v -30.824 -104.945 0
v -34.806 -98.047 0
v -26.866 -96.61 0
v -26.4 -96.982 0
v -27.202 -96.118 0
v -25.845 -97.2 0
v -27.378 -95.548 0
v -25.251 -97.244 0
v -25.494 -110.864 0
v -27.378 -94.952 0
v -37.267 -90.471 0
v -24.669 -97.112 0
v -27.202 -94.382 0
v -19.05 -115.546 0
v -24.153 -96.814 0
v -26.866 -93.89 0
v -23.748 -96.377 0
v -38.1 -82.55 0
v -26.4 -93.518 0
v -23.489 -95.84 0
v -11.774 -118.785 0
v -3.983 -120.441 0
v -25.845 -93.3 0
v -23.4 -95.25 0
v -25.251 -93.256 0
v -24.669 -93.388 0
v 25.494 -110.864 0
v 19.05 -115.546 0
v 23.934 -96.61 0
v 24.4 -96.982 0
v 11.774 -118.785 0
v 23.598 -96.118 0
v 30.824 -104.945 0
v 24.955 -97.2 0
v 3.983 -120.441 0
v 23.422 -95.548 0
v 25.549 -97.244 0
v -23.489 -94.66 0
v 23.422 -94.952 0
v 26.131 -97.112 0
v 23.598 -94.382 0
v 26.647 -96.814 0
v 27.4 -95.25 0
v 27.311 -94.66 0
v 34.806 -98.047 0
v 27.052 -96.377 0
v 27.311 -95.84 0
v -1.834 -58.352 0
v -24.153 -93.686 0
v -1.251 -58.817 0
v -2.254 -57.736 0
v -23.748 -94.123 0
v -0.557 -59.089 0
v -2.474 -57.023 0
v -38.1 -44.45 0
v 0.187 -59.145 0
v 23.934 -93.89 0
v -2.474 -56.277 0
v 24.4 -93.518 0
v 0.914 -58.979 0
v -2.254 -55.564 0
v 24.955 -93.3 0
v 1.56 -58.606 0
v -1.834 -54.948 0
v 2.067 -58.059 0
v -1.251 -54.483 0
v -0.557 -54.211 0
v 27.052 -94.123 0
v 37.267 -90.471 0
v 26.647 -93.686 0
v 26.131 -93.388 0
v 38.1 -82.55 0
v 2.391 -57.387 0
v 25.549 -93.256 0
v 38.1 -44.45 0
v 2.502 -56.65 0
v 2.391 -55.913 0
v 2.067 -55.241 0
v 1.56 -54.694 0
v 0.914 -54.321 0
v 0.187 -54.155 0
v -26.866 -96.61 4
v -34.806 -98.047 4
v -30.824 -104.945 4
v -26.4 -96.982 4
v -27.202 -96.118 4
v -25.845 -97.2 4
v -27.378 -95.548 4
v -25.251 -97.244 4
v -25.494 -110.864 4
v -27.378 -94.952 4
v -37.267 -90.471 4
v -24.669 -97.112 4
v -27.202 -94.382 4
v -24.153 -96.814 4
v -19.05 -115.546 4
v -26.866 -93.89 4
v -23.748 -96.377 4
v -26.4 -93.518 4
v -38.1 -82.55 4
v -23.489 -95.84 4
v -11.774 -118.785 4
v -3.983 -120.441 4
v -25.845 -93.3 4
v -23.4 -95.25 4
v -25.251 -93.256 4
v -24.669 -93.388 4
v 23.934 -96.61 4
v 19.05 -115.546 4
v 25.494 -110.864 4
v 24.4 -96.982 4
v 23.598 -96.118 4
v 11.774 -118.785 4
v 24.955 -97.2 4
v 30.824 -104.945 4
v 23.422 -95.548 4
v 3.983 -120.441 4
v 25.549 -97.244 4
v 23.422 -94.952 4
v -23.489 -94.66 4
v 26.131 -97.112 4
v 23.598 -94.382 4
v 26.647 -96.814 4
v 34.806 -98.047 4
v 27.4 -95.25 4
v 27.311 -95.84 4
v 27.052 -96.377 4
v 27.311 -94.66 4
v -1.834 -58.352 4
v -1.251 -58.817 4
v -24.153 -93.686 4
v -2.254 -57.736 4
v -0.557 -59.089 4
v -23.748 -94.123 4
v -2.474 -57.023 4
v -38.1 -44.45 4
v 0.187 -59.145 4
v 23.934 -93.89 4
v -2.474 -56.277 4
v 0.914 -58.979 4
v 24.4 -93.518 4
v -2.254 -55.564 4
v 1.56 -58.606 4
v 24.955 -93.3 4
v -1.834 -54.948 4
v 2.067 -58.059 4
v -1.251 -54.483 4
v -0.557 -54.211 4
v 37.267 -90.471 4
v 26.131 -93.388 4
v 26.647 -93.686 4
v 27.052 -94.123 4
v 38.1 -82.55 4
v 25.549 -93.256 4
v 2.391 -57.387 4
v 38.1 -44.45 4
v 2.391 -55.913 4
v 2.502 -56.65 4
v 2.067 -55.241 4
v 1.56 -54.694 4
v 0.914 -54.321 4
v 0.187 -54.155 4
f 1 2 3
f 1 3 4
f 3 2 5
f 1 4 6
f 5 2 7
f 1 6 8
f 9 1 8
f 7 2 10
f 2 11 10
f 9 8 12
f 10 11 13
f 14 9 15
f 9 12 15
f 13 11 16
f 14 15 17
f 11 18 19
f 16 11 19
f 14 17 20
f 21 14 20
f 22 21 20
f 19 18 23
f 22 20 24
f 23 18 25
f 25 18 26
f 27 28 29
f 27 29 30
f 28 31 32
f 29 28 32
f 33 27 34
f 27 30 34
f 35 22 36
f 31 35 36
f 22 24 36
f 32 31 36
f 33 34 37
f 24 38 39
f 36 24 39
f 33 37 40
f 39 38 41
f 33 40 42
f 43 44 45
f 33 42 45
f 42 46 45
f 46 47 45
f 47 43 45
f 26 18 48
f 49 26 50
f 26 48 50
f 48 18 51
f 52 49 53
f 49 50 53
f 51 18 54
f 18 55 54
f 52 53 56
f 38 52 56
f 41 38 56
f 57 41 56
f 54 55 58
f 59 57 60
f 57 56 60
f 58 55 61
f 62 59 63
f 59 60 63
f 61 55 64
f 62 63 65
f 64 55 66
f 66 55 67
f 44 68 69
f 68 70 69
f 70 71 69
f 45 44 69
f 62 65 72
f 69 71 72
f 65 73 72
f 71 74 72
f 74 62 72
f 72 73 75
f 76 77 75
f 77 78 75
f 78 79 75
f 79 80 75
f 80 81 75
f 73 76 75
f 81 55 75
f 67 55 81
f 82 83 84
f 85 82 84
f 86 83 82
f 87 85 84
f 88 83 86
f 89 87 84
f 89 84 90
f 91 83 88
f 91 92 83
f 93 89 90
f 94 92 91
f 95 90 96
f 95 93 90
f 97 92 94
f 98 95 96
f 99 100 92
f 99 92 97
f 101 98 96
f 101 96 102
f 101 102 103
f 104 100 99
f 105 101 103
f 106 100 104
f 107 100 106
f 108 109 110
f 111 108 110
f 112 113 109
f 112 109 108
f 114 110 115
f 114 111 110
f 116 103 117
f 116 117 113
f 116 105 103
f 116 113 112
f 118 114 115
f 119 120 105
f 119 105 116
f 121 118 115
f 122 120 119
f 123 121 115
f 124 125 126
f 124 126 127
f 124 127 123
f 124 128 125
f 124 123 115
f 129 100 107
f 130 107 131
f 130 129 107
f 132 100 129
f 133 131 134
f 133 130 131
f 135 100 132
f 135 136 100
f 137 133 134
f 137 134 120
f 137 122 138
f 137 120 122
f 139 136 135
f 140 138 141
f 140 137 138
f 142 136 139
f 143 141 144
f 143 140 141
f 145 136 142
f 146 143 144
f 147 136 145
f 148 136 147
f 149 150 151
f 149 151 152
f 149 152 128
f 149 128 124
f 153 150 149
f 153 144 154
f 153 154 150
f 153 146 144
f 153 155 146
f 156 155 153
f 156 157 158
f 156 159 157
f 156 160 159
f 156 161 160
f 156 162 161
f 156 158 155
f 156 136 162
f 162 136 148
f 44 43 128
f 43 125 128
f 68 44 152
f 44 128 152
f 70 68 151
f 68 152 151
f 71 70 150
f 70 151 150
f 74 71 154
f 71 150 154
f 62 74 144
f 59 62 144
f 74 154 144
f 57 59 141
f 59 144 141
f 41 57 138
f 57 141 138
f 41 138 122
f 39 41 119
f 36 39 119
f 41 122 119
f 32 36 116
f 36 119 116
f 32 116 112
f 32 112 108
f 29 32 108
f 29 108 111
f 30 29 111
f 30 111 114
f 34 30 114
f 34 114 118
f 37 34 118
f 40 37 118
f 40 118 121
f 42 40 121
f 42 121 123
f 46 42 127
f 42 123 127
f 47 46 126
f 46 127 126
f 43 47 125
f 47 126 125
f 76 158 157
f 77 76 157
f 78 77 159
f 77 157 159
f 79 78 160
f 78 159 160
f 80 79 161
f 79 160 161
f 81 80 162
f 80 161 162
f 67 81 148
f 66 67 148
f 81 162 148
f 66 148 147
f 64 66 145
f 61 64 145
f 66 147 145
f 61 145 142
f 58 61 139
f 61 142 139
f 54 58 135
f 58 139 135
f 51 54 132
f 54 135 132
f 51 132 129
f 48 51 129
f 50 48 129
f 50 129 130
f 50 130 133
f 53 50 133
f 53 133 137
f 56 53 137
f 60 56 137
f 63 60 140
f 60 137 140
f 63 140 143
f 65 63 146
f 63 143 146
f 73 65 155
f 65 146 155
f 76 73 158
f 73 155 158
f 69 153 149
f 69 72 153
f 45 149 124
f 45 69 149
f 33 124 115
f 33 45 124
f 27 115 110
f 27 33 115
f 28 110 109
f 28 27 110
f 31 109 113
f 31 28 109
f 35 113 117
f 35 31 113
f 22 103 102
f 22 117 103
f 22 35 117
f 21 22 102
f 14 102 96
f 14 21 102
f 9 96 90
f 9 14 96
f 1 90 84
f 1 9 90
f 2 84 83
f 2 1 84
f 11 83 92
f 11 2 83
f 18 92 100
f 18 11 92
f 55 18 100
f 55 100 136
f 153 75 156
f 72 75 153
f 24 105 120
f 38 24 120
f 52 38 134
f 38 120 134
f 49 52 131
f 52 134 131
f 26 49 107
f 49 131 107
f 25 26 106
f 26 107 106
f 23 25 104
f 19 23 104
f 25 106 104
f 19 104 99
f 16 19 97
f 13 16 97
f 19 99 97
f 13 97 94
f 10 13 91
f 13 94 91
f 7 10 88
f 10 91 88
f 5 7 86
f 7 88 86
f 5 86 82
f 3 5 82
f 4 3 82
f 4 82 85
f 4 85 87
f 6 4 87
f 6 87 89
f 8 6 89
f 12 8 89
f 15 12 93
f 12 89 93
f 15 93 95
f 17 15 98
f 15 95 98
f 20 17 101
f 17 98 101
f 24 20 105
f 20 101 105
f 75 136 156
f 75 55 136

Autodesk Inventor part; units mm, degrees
ref_plane "YZ Plane" through (0, 0, 0) normal (1, 0, 0) x (0, 1, 0)
ref_plane "XZ Plane" through (0, 0, 0) normal (0, 1, 0) x (-1, 0, 0)
sketch "Sketch1" plane through (0, 0, 0) normal (0, 0, 1) x (1, 0, 0)
  line L0 (6.35, -214.55) -> (43.1, -214.55) projected
  line L1 (43.1, -214.55) -> (43.1, -189.15) projected
  line L2 (43.1, -189.15) -> (40.1028, -189.15) projected
  line L3 (40.1028, -189.15) -> (40.1028, -176.45) projected
  line L4 (40.1028, -176.45) -> (43.1, -176.45) projected
  line L5 (43.1, -176.45) -> (43.1, -110.25) projected
  line L6 (43.1, -110.25) -> (40.1028, -110.25) projected
  line L7 (40.1028, -110.25) -> (40.1028, -97.55) projected
  line L8 (40.1028, -97.55) -> (43.1, -97.55) projected
  line L9 (43.1, -97.55) -> (43.1, -72.15) projected
  line L10 (43.1, -72.15) -> (35.023, -72.15) projected
  arc A0 (-35.023, -72.15) -> (35.023, -72.15) centre (0, -57.15) ccw projected
  line L11 (-35.023, -72.15) -> (-43.1, -72.15) projected
  line L12 (-43.1, -72.15) -> (-43.1, -97.55) projected
  line L13 (-43.1, -97.55) -> (-40.1028, -97.55) projected
  line L14 (-40.1028, -97.55) -> (-40.1028, -110.25) projected
  line L15 (-40.1028, -110.25) -> (-43.1, -110.25) projected
  line L16 (-43.1, -110.25) -> (-43.1, -176.45) projected
  line L17 (-43.1, -176.45) -> (-40.1028, -176.45) projected
  line L18 (-40.1028, -176.45) -> (-40.1028, -189.15) projected
  line L19 (-40.1028, -189.15) -> (-43.1, -189.15) projected
  line L20 (-43.1, -189.15) -> (-43.1, -214.55) projected
  line L21 (-43.1, -214.55) -> (-6.35, -214.55) projected
  line L22 (-11.16, -143.04) -> (-11.16, -138.135) projected
  line L23 (-11.16, -138.135) -> (10.16, -138.135) projected
  line L24 (10.16, -138.135) -> (10.16, -168.265) projected
  line L25 (10.16, -168.265) -> (-11.16, -168.265) projected
  line L26 (-11.16, -168.265) -> (-11.16, -159.55) projected
  line L27 (-11.16, -159.55) -> (-19.058, -159.55) projected
  line L28 (-19.058, -159.55) -> (-19.058, -164.622) projected
  line L29 (-19.058, -164.622) -> (-22.598, -164.622) projected
  line L30 (-22.598, -164.622) -> (-22.598, -159.55) projected
  line L31 (-22.598, -159.55) -> (-32.258, -159.55) projected
  line L32 (-32.258, -159.55) -> (-32.258, -167.805) projected
  line L33 (-32.258, -167.805) -> (-34.29, -167.805) projected
  line L34 (-34.29, -167.805) -> (-34.29, -159.55) projected
  line L35 (-34.29, -159.55) -> (-38.1, -159.55) projected
  line L36 (-38.1, -159.55) -> (-38.1, -136.69) projected
  line L37 (-38.1, -136.69) -> (-22.598, -136.69) projected
  line L38 (-22.598, -136.69) -> (-22.598, -131.618) projected
  line L39 (-22.598, -131.618) -> (-19.058, -131.618) projected
  line L40 (-19.058, -131.618) -> (-19.058, -136.69) projected
  line L41 (-19.058, -136.69) -> (-15.24, -136.69) projected
  line L42 (-15.24, -136.69) -> (-15.24, -143.04) projected
  arc A1 (-38.1, -57.15) -> (38.1, -57.15) centre (0, -57.15) ccw projected
  line L43 (0, -57.15) -> (0, -82.55)
  circle A2 centre (0, -82.55) radius 38.1
  line L44 (38.1, -82.55) -> (-38.1, -82.55)
  line L45 (-38.1, -82.55) -> (-38.1, -44.45)
  line L46 (-38.1, -44.45) -> (38.1, -44.45)
  line L47 (38.1, -44.45) -> (38.1, -82.55)
  circle A3 centre (25.4, -95.25) radius 1.5 projected
  circle A4 centre (-25.4, -95.25) radius 1.5 projected
  line L48 (-15.24, -143.04) -> (-11.16, -143.04) projected
  line L49 (-6.35, -214.55) -> (-6.35, -203.8154) projected
  line L50 (-6.35, -203.8154) -> (6.35, -203.8154) projected
  line L51 (6.35, -203.8154) -> (6.35, -214.55) projected
  point P0 (0, 0)
  dimension "d1" = 76.2
  dimension "d0" = 25.4
extrude "Extrusion1" add sketch "Sketch1" along normal blind 4 contours L47 A2 L10 | L10 A2 A1 L47 | A2 L44 A0 L10 | L10 A1 A2 | A1 A2 L46 L47 | A2 L44 A0 | A0 L44 A1 A2 | L45 L11 A2 | A2 L11 A0 L44 | A0 L44 | A2 A1 L45 L46 | A2 A1 L11 | L11 L45 A1 A2 | A3 | A4
ref_plane "Work Plane1" through (0, -135.7786, 0) normal (0, 0, 1) x (1, 0, 0)
sketch "Sketch2" plane through (0, 0, 4) normal (0, 0, 1) x (1, 0, 0)
  line L0 (-40.1, -31.75) -> (-43.1, -31.75) projected
  line L1 (-43.1, -31.75) -> (-43.1, -57.15) projected
  line L2 (-43.1, -57.15) -> (-38.1, -57.15) projected
  arc A0 (-38.1, -57.15) -> (38.1, -57.15) centre (0, -57.15) ccw projected
  line L3 (38.1, -57.15) -> (43.1, -57.15) projected
  line L4 (43.1, -57.15) -> (43.1, -31.75) projected
  line L5 (43.1, -31.75) -> (40.1, -31.75) projected
  line L6 (40.1, -31.75) -> (40.1, -19.05) projected
  line L7 (40.1, -19.05) -> (43.1, -19.05) projected
  line L8 (43.1, -19.05) -> (43.1, 24.05) projected
  line L9 (43.1, 24.05) -> (40.1, 24.05) projected
  line L10 (40.1, 24.05) -> (40.1, 36.75) projected
  line L11 (40.1, 36.75) -> (43.1, 36.75) projected
  line L12 (43.1, 36.75) -> (43.1, 62.15) projected
  line L13 (14, 62.15) -> (-14, 62.15) projected
  line L14 (-43.1, 62.15) -> (-43.1, 36.75) projected
  line L15 (-43.1, 36.75) -> (-40.1, 36.75) projected
  line L16 (-40.1, 36.75) -> (-40.1, 24.05) projected
  line L17 (-40.1, 24.05) -> (-43.1, 24.05) projected
  line L18 (-43.1, 24.05) -> (-43.1, -19.05) projected
  line L19 (-43.1, -19.05) -> (-40.1, -19.05) projected
  line L20 (-40.1, -19.05) -> (-40.1, -31.75) projected
  line L21 (15.24, -5.55) -> (11.16, -5.55) projected
  line L22 (11.16, -5.55) -> (11.16, -14.265) projected
  line L23 (11.16, -14.265) -> (-10.16, -14.265) projected
  line L24 (-10.16, -14.265) -> (-10.16, 15.865) projected
  line L25 (-10.16, 15.865) -> (11.16, 15.865) projected
  line L26 (11.16, 15.865) -> (11.16, 7.15) projected
  line L27 (11.16, 7.15) -> (19.058, 7.15) projected
  line L28 (22.598, 7.15) -> (32.266, 7.15) projected
  line L29 (32.266, 7.15) -> (32.266, 15.405) projected
  line L30 (32.266, 15.405) -> (34.282, 15.405) projected
  line L31 (34.282, 15.405) -> (34.282, 7.15) projected
  line L32 (34.282, 7.15) -> (38.1, 7.15) projected
  line L33 (38.1, 7.15) -> (38.1, -15.71) projected
  line L34 (38.1, -15.71) -> (22.598, -15.71) projected
  line L35 (19.058, -15.71) -> (15.24, -15.71) projected
  line L36 (15.24, -15.71) -> (15.24, -5.55) projected
  line L37 (19.058, 7.15) -> (19.058, 12.222) projected
  line L38 (19.058, 12.222) -> (22.598, 12.222) projected
  line L39 (22.598, 12.222) -> (22.598, 7.15) projected
  line L40 (22.598, -15.71) -> (22.598, -20.782) projected
  line L41 (22.598, -20.782) -> (19.058, -20.782) projected
  line L42 (19.058, -20.782) -> (19.058, -15.71) projected
  line L43 (-14, 62.15) -> (-14, 31.5) projected
  line L44 (-14, 31.5) -> (-30.4, 31.5) projected
  line L45 (-30.4, 31.5) -> (-30.4, 62.15) projected
  line L46 (-30.4, 62.15) -> (-43.1, 62.15) projected
  line L47 (43.1, 62.15) -> (30.4, 62.15) projected
  line L48 (30.4, 62.15) -> (30.4, 31.5) projected
  line L49 (30.4, 31.5) -> (14, 31.5) projected
  line L50 (14, 31.5) -> (14, 62.15) projected
  line L51 (0, -57.15) -> (0, -56.65)
  circle A1 centre (0, -56.65) radius 2.5019
  point P0 (0, 0)
  dimension "d13" = 0.5
  dimension "d14" = 5.0038
extrude "Extrusion2" cut sketch "Sketch2" against normal blind 4 contours A1
sketch "Sketch3" plane through (0, 0, 4) normal (0, 0, 1) x (1, 0, 0)
  arc A0 (-35.023, -72.15) -> (35.023, -72.15) centre (0, -57.15) ccw projected
  line L0 (-6.35, -214.55) -> (-6.35, -203.8154) projected
  line L1 (-6.35, -203.8154) -> (6.35, -203.8154) projected
  line L2 (6.35, -203.8154) -> (6.35, -214.55) projected
  line L3 (6.35, -214.55) -> (43.1, -214.55) projected
  line L4 (43.1, -214.55) -> (43.1, -189.15) projected
  line L5 (43.1, -189.15) -> (40.1028, -189.15) projected
  line L6 (40.1028, -189.15) -> (40.1028, -176.45) projected
  line L7 (40.1028, -176.45) -> (43.1, -176.45) projected
  line L8 (43.1, -176.45) -> (43.1, -110.25) projected
  line L9 (43.1, -110.25) -> (40.1028, -110.25) projected
  line L10 (40.1028, -110.25) -> (40.1028, -97.55) projected
  line L11 (40.1028, -97.55) -> (43.1, -97.55) projected
  line L12 (43.1, -97.55) -> (43.1, -72.15) projected
  line L13 (43.1, -72.15) -> (35.023, -72.15) projected
  arc A1 (-35.023, -72.15) -> (35.023, -72.15) centre (0, -57.15) ccw projected
  line L14 (-35.023, -72.15) -> (-43.1, -72.15) projected
  line L15 (-43.1, -72.15) -> (-43.1, -97.55) projected
  line L16 (-43.1, -97.55) -> (-40.1028, -97.55) projected
  line L17 (-40.1028, -97.55) -> (-40.1028, -110.25) projected
  line L18 (-40.1028, -110.25) -> (-43.1, -110.25) projected
  line L19 (-43.1, -110.25) -> (-43.1, -176.45) projected
  line L20 (-43.1, -176.45) -> (-40.1028, -176.45) projected
  line L21 (-40.1028, -176.45) -> (-40.1028, -189.15) projected
  line L22 (-40.1028, -189.15) -> (-43.1, -189.15) projected
  line L23 (-43.1, -189.15) -> (-43.1, -214.55) projected
  line L24 (-43.1, -214.55) -> (-6.35, -214.55) projected
  line L25 (-11.16, -143.04) -> (-11.16, -138.135) projected
  line L26 (-11.16, -138.135) -> (10.16, -138.135) projected
  line L27 (10.16, -138.135) -> (10.16, -168.265) projected
  line L28 (10.16, -168.265) -> (-11.16, -168.265) projected
  line L29 (-11.16, -168.265) -> (-11.16, -159.55) projected
  line L30 (-11.16, -159.55) -> (-19.058, -159.55) projected
  line L31 (-19.058, -159.55) -> (-19.058, -164.622) projected
  line L32 (-19.058, -164.622) -> (-22.598, -164.622) projected
  line L33 (-22.598, -164.622) -> (-22.598, -159.55) projected
  line L34 (-22.598, -159.55) -> (-32.258, -159.55) projected
  line L35 (-32.258, -159.55) -> (-32.258, -167.805) projected
  line L36 (-32.258, -167.805) -> (-34.29, -167.805) projected
  line L37 (-34.29, -167.805) -> (-34.29, -159.55) projected
  line L38 (-34.29, -159.55) -> (-38.1, -159.55) projected
  line L39 (-38.1, -159.55) -> (-38.1, -136.69) projected
  line L40 (-38.1, -136.69) -> (-22.598, -136.69) projected
  line L41 (-22.598, -136.69) -> (-22.598, -131.618) projected
  line L42 (-22.598, -131.618) -> (-19.058, -131.618) projected
  line L43 (-19.058, -131.618) -> (-19.058, -136.69) projected
  line L44 (-19.058, -136.69) -> (-15.24, -136.69) projected
  line L45 (-15.24, -136.69) -> (-15.24, -143.04) projected
  arc A2 (-38.1, -82.55) -> (38.1, -82.55) centre (0, -82.55) ccw projected
  line L46 (38.1, -82.55) -> (38.1, -44.45) projected
  line L47 (38.1, -44.45) -> (-38.1, -44.45) projected
  line L48 (-38.1, -44.45) -> (-38.1, -82.55) projected
  line L49 (0, -95.25) -> (25.4, -95.25)
  line L50 (25.4, -95.25) -> (-25.4, -95.25)
  circle A3 centre (25.4, -95.25) radius 2
  circle A4 centre (-25.4, -95.25) radius 2
  circle A5 centre (25.4, -95.25) radius 1.5 projected
  circle A6 centre (-25.4, -95.25) radius 1.5 projected
  line L51 (-15.24, -143.04) -> (-11.16, -143.04) projected
  point P0 (0, 0)
  dimension "d7" = 25.4
  dimension "d8" = 50.8
  dimension "d9" = 4
  dimension "d10" = 4
extrude "Extrusion3" cut sketch "Sketch3" against normal blind 25.4 contours A3 | A4 | A5 | A6
properties part number "LargeConnectorBodies"
